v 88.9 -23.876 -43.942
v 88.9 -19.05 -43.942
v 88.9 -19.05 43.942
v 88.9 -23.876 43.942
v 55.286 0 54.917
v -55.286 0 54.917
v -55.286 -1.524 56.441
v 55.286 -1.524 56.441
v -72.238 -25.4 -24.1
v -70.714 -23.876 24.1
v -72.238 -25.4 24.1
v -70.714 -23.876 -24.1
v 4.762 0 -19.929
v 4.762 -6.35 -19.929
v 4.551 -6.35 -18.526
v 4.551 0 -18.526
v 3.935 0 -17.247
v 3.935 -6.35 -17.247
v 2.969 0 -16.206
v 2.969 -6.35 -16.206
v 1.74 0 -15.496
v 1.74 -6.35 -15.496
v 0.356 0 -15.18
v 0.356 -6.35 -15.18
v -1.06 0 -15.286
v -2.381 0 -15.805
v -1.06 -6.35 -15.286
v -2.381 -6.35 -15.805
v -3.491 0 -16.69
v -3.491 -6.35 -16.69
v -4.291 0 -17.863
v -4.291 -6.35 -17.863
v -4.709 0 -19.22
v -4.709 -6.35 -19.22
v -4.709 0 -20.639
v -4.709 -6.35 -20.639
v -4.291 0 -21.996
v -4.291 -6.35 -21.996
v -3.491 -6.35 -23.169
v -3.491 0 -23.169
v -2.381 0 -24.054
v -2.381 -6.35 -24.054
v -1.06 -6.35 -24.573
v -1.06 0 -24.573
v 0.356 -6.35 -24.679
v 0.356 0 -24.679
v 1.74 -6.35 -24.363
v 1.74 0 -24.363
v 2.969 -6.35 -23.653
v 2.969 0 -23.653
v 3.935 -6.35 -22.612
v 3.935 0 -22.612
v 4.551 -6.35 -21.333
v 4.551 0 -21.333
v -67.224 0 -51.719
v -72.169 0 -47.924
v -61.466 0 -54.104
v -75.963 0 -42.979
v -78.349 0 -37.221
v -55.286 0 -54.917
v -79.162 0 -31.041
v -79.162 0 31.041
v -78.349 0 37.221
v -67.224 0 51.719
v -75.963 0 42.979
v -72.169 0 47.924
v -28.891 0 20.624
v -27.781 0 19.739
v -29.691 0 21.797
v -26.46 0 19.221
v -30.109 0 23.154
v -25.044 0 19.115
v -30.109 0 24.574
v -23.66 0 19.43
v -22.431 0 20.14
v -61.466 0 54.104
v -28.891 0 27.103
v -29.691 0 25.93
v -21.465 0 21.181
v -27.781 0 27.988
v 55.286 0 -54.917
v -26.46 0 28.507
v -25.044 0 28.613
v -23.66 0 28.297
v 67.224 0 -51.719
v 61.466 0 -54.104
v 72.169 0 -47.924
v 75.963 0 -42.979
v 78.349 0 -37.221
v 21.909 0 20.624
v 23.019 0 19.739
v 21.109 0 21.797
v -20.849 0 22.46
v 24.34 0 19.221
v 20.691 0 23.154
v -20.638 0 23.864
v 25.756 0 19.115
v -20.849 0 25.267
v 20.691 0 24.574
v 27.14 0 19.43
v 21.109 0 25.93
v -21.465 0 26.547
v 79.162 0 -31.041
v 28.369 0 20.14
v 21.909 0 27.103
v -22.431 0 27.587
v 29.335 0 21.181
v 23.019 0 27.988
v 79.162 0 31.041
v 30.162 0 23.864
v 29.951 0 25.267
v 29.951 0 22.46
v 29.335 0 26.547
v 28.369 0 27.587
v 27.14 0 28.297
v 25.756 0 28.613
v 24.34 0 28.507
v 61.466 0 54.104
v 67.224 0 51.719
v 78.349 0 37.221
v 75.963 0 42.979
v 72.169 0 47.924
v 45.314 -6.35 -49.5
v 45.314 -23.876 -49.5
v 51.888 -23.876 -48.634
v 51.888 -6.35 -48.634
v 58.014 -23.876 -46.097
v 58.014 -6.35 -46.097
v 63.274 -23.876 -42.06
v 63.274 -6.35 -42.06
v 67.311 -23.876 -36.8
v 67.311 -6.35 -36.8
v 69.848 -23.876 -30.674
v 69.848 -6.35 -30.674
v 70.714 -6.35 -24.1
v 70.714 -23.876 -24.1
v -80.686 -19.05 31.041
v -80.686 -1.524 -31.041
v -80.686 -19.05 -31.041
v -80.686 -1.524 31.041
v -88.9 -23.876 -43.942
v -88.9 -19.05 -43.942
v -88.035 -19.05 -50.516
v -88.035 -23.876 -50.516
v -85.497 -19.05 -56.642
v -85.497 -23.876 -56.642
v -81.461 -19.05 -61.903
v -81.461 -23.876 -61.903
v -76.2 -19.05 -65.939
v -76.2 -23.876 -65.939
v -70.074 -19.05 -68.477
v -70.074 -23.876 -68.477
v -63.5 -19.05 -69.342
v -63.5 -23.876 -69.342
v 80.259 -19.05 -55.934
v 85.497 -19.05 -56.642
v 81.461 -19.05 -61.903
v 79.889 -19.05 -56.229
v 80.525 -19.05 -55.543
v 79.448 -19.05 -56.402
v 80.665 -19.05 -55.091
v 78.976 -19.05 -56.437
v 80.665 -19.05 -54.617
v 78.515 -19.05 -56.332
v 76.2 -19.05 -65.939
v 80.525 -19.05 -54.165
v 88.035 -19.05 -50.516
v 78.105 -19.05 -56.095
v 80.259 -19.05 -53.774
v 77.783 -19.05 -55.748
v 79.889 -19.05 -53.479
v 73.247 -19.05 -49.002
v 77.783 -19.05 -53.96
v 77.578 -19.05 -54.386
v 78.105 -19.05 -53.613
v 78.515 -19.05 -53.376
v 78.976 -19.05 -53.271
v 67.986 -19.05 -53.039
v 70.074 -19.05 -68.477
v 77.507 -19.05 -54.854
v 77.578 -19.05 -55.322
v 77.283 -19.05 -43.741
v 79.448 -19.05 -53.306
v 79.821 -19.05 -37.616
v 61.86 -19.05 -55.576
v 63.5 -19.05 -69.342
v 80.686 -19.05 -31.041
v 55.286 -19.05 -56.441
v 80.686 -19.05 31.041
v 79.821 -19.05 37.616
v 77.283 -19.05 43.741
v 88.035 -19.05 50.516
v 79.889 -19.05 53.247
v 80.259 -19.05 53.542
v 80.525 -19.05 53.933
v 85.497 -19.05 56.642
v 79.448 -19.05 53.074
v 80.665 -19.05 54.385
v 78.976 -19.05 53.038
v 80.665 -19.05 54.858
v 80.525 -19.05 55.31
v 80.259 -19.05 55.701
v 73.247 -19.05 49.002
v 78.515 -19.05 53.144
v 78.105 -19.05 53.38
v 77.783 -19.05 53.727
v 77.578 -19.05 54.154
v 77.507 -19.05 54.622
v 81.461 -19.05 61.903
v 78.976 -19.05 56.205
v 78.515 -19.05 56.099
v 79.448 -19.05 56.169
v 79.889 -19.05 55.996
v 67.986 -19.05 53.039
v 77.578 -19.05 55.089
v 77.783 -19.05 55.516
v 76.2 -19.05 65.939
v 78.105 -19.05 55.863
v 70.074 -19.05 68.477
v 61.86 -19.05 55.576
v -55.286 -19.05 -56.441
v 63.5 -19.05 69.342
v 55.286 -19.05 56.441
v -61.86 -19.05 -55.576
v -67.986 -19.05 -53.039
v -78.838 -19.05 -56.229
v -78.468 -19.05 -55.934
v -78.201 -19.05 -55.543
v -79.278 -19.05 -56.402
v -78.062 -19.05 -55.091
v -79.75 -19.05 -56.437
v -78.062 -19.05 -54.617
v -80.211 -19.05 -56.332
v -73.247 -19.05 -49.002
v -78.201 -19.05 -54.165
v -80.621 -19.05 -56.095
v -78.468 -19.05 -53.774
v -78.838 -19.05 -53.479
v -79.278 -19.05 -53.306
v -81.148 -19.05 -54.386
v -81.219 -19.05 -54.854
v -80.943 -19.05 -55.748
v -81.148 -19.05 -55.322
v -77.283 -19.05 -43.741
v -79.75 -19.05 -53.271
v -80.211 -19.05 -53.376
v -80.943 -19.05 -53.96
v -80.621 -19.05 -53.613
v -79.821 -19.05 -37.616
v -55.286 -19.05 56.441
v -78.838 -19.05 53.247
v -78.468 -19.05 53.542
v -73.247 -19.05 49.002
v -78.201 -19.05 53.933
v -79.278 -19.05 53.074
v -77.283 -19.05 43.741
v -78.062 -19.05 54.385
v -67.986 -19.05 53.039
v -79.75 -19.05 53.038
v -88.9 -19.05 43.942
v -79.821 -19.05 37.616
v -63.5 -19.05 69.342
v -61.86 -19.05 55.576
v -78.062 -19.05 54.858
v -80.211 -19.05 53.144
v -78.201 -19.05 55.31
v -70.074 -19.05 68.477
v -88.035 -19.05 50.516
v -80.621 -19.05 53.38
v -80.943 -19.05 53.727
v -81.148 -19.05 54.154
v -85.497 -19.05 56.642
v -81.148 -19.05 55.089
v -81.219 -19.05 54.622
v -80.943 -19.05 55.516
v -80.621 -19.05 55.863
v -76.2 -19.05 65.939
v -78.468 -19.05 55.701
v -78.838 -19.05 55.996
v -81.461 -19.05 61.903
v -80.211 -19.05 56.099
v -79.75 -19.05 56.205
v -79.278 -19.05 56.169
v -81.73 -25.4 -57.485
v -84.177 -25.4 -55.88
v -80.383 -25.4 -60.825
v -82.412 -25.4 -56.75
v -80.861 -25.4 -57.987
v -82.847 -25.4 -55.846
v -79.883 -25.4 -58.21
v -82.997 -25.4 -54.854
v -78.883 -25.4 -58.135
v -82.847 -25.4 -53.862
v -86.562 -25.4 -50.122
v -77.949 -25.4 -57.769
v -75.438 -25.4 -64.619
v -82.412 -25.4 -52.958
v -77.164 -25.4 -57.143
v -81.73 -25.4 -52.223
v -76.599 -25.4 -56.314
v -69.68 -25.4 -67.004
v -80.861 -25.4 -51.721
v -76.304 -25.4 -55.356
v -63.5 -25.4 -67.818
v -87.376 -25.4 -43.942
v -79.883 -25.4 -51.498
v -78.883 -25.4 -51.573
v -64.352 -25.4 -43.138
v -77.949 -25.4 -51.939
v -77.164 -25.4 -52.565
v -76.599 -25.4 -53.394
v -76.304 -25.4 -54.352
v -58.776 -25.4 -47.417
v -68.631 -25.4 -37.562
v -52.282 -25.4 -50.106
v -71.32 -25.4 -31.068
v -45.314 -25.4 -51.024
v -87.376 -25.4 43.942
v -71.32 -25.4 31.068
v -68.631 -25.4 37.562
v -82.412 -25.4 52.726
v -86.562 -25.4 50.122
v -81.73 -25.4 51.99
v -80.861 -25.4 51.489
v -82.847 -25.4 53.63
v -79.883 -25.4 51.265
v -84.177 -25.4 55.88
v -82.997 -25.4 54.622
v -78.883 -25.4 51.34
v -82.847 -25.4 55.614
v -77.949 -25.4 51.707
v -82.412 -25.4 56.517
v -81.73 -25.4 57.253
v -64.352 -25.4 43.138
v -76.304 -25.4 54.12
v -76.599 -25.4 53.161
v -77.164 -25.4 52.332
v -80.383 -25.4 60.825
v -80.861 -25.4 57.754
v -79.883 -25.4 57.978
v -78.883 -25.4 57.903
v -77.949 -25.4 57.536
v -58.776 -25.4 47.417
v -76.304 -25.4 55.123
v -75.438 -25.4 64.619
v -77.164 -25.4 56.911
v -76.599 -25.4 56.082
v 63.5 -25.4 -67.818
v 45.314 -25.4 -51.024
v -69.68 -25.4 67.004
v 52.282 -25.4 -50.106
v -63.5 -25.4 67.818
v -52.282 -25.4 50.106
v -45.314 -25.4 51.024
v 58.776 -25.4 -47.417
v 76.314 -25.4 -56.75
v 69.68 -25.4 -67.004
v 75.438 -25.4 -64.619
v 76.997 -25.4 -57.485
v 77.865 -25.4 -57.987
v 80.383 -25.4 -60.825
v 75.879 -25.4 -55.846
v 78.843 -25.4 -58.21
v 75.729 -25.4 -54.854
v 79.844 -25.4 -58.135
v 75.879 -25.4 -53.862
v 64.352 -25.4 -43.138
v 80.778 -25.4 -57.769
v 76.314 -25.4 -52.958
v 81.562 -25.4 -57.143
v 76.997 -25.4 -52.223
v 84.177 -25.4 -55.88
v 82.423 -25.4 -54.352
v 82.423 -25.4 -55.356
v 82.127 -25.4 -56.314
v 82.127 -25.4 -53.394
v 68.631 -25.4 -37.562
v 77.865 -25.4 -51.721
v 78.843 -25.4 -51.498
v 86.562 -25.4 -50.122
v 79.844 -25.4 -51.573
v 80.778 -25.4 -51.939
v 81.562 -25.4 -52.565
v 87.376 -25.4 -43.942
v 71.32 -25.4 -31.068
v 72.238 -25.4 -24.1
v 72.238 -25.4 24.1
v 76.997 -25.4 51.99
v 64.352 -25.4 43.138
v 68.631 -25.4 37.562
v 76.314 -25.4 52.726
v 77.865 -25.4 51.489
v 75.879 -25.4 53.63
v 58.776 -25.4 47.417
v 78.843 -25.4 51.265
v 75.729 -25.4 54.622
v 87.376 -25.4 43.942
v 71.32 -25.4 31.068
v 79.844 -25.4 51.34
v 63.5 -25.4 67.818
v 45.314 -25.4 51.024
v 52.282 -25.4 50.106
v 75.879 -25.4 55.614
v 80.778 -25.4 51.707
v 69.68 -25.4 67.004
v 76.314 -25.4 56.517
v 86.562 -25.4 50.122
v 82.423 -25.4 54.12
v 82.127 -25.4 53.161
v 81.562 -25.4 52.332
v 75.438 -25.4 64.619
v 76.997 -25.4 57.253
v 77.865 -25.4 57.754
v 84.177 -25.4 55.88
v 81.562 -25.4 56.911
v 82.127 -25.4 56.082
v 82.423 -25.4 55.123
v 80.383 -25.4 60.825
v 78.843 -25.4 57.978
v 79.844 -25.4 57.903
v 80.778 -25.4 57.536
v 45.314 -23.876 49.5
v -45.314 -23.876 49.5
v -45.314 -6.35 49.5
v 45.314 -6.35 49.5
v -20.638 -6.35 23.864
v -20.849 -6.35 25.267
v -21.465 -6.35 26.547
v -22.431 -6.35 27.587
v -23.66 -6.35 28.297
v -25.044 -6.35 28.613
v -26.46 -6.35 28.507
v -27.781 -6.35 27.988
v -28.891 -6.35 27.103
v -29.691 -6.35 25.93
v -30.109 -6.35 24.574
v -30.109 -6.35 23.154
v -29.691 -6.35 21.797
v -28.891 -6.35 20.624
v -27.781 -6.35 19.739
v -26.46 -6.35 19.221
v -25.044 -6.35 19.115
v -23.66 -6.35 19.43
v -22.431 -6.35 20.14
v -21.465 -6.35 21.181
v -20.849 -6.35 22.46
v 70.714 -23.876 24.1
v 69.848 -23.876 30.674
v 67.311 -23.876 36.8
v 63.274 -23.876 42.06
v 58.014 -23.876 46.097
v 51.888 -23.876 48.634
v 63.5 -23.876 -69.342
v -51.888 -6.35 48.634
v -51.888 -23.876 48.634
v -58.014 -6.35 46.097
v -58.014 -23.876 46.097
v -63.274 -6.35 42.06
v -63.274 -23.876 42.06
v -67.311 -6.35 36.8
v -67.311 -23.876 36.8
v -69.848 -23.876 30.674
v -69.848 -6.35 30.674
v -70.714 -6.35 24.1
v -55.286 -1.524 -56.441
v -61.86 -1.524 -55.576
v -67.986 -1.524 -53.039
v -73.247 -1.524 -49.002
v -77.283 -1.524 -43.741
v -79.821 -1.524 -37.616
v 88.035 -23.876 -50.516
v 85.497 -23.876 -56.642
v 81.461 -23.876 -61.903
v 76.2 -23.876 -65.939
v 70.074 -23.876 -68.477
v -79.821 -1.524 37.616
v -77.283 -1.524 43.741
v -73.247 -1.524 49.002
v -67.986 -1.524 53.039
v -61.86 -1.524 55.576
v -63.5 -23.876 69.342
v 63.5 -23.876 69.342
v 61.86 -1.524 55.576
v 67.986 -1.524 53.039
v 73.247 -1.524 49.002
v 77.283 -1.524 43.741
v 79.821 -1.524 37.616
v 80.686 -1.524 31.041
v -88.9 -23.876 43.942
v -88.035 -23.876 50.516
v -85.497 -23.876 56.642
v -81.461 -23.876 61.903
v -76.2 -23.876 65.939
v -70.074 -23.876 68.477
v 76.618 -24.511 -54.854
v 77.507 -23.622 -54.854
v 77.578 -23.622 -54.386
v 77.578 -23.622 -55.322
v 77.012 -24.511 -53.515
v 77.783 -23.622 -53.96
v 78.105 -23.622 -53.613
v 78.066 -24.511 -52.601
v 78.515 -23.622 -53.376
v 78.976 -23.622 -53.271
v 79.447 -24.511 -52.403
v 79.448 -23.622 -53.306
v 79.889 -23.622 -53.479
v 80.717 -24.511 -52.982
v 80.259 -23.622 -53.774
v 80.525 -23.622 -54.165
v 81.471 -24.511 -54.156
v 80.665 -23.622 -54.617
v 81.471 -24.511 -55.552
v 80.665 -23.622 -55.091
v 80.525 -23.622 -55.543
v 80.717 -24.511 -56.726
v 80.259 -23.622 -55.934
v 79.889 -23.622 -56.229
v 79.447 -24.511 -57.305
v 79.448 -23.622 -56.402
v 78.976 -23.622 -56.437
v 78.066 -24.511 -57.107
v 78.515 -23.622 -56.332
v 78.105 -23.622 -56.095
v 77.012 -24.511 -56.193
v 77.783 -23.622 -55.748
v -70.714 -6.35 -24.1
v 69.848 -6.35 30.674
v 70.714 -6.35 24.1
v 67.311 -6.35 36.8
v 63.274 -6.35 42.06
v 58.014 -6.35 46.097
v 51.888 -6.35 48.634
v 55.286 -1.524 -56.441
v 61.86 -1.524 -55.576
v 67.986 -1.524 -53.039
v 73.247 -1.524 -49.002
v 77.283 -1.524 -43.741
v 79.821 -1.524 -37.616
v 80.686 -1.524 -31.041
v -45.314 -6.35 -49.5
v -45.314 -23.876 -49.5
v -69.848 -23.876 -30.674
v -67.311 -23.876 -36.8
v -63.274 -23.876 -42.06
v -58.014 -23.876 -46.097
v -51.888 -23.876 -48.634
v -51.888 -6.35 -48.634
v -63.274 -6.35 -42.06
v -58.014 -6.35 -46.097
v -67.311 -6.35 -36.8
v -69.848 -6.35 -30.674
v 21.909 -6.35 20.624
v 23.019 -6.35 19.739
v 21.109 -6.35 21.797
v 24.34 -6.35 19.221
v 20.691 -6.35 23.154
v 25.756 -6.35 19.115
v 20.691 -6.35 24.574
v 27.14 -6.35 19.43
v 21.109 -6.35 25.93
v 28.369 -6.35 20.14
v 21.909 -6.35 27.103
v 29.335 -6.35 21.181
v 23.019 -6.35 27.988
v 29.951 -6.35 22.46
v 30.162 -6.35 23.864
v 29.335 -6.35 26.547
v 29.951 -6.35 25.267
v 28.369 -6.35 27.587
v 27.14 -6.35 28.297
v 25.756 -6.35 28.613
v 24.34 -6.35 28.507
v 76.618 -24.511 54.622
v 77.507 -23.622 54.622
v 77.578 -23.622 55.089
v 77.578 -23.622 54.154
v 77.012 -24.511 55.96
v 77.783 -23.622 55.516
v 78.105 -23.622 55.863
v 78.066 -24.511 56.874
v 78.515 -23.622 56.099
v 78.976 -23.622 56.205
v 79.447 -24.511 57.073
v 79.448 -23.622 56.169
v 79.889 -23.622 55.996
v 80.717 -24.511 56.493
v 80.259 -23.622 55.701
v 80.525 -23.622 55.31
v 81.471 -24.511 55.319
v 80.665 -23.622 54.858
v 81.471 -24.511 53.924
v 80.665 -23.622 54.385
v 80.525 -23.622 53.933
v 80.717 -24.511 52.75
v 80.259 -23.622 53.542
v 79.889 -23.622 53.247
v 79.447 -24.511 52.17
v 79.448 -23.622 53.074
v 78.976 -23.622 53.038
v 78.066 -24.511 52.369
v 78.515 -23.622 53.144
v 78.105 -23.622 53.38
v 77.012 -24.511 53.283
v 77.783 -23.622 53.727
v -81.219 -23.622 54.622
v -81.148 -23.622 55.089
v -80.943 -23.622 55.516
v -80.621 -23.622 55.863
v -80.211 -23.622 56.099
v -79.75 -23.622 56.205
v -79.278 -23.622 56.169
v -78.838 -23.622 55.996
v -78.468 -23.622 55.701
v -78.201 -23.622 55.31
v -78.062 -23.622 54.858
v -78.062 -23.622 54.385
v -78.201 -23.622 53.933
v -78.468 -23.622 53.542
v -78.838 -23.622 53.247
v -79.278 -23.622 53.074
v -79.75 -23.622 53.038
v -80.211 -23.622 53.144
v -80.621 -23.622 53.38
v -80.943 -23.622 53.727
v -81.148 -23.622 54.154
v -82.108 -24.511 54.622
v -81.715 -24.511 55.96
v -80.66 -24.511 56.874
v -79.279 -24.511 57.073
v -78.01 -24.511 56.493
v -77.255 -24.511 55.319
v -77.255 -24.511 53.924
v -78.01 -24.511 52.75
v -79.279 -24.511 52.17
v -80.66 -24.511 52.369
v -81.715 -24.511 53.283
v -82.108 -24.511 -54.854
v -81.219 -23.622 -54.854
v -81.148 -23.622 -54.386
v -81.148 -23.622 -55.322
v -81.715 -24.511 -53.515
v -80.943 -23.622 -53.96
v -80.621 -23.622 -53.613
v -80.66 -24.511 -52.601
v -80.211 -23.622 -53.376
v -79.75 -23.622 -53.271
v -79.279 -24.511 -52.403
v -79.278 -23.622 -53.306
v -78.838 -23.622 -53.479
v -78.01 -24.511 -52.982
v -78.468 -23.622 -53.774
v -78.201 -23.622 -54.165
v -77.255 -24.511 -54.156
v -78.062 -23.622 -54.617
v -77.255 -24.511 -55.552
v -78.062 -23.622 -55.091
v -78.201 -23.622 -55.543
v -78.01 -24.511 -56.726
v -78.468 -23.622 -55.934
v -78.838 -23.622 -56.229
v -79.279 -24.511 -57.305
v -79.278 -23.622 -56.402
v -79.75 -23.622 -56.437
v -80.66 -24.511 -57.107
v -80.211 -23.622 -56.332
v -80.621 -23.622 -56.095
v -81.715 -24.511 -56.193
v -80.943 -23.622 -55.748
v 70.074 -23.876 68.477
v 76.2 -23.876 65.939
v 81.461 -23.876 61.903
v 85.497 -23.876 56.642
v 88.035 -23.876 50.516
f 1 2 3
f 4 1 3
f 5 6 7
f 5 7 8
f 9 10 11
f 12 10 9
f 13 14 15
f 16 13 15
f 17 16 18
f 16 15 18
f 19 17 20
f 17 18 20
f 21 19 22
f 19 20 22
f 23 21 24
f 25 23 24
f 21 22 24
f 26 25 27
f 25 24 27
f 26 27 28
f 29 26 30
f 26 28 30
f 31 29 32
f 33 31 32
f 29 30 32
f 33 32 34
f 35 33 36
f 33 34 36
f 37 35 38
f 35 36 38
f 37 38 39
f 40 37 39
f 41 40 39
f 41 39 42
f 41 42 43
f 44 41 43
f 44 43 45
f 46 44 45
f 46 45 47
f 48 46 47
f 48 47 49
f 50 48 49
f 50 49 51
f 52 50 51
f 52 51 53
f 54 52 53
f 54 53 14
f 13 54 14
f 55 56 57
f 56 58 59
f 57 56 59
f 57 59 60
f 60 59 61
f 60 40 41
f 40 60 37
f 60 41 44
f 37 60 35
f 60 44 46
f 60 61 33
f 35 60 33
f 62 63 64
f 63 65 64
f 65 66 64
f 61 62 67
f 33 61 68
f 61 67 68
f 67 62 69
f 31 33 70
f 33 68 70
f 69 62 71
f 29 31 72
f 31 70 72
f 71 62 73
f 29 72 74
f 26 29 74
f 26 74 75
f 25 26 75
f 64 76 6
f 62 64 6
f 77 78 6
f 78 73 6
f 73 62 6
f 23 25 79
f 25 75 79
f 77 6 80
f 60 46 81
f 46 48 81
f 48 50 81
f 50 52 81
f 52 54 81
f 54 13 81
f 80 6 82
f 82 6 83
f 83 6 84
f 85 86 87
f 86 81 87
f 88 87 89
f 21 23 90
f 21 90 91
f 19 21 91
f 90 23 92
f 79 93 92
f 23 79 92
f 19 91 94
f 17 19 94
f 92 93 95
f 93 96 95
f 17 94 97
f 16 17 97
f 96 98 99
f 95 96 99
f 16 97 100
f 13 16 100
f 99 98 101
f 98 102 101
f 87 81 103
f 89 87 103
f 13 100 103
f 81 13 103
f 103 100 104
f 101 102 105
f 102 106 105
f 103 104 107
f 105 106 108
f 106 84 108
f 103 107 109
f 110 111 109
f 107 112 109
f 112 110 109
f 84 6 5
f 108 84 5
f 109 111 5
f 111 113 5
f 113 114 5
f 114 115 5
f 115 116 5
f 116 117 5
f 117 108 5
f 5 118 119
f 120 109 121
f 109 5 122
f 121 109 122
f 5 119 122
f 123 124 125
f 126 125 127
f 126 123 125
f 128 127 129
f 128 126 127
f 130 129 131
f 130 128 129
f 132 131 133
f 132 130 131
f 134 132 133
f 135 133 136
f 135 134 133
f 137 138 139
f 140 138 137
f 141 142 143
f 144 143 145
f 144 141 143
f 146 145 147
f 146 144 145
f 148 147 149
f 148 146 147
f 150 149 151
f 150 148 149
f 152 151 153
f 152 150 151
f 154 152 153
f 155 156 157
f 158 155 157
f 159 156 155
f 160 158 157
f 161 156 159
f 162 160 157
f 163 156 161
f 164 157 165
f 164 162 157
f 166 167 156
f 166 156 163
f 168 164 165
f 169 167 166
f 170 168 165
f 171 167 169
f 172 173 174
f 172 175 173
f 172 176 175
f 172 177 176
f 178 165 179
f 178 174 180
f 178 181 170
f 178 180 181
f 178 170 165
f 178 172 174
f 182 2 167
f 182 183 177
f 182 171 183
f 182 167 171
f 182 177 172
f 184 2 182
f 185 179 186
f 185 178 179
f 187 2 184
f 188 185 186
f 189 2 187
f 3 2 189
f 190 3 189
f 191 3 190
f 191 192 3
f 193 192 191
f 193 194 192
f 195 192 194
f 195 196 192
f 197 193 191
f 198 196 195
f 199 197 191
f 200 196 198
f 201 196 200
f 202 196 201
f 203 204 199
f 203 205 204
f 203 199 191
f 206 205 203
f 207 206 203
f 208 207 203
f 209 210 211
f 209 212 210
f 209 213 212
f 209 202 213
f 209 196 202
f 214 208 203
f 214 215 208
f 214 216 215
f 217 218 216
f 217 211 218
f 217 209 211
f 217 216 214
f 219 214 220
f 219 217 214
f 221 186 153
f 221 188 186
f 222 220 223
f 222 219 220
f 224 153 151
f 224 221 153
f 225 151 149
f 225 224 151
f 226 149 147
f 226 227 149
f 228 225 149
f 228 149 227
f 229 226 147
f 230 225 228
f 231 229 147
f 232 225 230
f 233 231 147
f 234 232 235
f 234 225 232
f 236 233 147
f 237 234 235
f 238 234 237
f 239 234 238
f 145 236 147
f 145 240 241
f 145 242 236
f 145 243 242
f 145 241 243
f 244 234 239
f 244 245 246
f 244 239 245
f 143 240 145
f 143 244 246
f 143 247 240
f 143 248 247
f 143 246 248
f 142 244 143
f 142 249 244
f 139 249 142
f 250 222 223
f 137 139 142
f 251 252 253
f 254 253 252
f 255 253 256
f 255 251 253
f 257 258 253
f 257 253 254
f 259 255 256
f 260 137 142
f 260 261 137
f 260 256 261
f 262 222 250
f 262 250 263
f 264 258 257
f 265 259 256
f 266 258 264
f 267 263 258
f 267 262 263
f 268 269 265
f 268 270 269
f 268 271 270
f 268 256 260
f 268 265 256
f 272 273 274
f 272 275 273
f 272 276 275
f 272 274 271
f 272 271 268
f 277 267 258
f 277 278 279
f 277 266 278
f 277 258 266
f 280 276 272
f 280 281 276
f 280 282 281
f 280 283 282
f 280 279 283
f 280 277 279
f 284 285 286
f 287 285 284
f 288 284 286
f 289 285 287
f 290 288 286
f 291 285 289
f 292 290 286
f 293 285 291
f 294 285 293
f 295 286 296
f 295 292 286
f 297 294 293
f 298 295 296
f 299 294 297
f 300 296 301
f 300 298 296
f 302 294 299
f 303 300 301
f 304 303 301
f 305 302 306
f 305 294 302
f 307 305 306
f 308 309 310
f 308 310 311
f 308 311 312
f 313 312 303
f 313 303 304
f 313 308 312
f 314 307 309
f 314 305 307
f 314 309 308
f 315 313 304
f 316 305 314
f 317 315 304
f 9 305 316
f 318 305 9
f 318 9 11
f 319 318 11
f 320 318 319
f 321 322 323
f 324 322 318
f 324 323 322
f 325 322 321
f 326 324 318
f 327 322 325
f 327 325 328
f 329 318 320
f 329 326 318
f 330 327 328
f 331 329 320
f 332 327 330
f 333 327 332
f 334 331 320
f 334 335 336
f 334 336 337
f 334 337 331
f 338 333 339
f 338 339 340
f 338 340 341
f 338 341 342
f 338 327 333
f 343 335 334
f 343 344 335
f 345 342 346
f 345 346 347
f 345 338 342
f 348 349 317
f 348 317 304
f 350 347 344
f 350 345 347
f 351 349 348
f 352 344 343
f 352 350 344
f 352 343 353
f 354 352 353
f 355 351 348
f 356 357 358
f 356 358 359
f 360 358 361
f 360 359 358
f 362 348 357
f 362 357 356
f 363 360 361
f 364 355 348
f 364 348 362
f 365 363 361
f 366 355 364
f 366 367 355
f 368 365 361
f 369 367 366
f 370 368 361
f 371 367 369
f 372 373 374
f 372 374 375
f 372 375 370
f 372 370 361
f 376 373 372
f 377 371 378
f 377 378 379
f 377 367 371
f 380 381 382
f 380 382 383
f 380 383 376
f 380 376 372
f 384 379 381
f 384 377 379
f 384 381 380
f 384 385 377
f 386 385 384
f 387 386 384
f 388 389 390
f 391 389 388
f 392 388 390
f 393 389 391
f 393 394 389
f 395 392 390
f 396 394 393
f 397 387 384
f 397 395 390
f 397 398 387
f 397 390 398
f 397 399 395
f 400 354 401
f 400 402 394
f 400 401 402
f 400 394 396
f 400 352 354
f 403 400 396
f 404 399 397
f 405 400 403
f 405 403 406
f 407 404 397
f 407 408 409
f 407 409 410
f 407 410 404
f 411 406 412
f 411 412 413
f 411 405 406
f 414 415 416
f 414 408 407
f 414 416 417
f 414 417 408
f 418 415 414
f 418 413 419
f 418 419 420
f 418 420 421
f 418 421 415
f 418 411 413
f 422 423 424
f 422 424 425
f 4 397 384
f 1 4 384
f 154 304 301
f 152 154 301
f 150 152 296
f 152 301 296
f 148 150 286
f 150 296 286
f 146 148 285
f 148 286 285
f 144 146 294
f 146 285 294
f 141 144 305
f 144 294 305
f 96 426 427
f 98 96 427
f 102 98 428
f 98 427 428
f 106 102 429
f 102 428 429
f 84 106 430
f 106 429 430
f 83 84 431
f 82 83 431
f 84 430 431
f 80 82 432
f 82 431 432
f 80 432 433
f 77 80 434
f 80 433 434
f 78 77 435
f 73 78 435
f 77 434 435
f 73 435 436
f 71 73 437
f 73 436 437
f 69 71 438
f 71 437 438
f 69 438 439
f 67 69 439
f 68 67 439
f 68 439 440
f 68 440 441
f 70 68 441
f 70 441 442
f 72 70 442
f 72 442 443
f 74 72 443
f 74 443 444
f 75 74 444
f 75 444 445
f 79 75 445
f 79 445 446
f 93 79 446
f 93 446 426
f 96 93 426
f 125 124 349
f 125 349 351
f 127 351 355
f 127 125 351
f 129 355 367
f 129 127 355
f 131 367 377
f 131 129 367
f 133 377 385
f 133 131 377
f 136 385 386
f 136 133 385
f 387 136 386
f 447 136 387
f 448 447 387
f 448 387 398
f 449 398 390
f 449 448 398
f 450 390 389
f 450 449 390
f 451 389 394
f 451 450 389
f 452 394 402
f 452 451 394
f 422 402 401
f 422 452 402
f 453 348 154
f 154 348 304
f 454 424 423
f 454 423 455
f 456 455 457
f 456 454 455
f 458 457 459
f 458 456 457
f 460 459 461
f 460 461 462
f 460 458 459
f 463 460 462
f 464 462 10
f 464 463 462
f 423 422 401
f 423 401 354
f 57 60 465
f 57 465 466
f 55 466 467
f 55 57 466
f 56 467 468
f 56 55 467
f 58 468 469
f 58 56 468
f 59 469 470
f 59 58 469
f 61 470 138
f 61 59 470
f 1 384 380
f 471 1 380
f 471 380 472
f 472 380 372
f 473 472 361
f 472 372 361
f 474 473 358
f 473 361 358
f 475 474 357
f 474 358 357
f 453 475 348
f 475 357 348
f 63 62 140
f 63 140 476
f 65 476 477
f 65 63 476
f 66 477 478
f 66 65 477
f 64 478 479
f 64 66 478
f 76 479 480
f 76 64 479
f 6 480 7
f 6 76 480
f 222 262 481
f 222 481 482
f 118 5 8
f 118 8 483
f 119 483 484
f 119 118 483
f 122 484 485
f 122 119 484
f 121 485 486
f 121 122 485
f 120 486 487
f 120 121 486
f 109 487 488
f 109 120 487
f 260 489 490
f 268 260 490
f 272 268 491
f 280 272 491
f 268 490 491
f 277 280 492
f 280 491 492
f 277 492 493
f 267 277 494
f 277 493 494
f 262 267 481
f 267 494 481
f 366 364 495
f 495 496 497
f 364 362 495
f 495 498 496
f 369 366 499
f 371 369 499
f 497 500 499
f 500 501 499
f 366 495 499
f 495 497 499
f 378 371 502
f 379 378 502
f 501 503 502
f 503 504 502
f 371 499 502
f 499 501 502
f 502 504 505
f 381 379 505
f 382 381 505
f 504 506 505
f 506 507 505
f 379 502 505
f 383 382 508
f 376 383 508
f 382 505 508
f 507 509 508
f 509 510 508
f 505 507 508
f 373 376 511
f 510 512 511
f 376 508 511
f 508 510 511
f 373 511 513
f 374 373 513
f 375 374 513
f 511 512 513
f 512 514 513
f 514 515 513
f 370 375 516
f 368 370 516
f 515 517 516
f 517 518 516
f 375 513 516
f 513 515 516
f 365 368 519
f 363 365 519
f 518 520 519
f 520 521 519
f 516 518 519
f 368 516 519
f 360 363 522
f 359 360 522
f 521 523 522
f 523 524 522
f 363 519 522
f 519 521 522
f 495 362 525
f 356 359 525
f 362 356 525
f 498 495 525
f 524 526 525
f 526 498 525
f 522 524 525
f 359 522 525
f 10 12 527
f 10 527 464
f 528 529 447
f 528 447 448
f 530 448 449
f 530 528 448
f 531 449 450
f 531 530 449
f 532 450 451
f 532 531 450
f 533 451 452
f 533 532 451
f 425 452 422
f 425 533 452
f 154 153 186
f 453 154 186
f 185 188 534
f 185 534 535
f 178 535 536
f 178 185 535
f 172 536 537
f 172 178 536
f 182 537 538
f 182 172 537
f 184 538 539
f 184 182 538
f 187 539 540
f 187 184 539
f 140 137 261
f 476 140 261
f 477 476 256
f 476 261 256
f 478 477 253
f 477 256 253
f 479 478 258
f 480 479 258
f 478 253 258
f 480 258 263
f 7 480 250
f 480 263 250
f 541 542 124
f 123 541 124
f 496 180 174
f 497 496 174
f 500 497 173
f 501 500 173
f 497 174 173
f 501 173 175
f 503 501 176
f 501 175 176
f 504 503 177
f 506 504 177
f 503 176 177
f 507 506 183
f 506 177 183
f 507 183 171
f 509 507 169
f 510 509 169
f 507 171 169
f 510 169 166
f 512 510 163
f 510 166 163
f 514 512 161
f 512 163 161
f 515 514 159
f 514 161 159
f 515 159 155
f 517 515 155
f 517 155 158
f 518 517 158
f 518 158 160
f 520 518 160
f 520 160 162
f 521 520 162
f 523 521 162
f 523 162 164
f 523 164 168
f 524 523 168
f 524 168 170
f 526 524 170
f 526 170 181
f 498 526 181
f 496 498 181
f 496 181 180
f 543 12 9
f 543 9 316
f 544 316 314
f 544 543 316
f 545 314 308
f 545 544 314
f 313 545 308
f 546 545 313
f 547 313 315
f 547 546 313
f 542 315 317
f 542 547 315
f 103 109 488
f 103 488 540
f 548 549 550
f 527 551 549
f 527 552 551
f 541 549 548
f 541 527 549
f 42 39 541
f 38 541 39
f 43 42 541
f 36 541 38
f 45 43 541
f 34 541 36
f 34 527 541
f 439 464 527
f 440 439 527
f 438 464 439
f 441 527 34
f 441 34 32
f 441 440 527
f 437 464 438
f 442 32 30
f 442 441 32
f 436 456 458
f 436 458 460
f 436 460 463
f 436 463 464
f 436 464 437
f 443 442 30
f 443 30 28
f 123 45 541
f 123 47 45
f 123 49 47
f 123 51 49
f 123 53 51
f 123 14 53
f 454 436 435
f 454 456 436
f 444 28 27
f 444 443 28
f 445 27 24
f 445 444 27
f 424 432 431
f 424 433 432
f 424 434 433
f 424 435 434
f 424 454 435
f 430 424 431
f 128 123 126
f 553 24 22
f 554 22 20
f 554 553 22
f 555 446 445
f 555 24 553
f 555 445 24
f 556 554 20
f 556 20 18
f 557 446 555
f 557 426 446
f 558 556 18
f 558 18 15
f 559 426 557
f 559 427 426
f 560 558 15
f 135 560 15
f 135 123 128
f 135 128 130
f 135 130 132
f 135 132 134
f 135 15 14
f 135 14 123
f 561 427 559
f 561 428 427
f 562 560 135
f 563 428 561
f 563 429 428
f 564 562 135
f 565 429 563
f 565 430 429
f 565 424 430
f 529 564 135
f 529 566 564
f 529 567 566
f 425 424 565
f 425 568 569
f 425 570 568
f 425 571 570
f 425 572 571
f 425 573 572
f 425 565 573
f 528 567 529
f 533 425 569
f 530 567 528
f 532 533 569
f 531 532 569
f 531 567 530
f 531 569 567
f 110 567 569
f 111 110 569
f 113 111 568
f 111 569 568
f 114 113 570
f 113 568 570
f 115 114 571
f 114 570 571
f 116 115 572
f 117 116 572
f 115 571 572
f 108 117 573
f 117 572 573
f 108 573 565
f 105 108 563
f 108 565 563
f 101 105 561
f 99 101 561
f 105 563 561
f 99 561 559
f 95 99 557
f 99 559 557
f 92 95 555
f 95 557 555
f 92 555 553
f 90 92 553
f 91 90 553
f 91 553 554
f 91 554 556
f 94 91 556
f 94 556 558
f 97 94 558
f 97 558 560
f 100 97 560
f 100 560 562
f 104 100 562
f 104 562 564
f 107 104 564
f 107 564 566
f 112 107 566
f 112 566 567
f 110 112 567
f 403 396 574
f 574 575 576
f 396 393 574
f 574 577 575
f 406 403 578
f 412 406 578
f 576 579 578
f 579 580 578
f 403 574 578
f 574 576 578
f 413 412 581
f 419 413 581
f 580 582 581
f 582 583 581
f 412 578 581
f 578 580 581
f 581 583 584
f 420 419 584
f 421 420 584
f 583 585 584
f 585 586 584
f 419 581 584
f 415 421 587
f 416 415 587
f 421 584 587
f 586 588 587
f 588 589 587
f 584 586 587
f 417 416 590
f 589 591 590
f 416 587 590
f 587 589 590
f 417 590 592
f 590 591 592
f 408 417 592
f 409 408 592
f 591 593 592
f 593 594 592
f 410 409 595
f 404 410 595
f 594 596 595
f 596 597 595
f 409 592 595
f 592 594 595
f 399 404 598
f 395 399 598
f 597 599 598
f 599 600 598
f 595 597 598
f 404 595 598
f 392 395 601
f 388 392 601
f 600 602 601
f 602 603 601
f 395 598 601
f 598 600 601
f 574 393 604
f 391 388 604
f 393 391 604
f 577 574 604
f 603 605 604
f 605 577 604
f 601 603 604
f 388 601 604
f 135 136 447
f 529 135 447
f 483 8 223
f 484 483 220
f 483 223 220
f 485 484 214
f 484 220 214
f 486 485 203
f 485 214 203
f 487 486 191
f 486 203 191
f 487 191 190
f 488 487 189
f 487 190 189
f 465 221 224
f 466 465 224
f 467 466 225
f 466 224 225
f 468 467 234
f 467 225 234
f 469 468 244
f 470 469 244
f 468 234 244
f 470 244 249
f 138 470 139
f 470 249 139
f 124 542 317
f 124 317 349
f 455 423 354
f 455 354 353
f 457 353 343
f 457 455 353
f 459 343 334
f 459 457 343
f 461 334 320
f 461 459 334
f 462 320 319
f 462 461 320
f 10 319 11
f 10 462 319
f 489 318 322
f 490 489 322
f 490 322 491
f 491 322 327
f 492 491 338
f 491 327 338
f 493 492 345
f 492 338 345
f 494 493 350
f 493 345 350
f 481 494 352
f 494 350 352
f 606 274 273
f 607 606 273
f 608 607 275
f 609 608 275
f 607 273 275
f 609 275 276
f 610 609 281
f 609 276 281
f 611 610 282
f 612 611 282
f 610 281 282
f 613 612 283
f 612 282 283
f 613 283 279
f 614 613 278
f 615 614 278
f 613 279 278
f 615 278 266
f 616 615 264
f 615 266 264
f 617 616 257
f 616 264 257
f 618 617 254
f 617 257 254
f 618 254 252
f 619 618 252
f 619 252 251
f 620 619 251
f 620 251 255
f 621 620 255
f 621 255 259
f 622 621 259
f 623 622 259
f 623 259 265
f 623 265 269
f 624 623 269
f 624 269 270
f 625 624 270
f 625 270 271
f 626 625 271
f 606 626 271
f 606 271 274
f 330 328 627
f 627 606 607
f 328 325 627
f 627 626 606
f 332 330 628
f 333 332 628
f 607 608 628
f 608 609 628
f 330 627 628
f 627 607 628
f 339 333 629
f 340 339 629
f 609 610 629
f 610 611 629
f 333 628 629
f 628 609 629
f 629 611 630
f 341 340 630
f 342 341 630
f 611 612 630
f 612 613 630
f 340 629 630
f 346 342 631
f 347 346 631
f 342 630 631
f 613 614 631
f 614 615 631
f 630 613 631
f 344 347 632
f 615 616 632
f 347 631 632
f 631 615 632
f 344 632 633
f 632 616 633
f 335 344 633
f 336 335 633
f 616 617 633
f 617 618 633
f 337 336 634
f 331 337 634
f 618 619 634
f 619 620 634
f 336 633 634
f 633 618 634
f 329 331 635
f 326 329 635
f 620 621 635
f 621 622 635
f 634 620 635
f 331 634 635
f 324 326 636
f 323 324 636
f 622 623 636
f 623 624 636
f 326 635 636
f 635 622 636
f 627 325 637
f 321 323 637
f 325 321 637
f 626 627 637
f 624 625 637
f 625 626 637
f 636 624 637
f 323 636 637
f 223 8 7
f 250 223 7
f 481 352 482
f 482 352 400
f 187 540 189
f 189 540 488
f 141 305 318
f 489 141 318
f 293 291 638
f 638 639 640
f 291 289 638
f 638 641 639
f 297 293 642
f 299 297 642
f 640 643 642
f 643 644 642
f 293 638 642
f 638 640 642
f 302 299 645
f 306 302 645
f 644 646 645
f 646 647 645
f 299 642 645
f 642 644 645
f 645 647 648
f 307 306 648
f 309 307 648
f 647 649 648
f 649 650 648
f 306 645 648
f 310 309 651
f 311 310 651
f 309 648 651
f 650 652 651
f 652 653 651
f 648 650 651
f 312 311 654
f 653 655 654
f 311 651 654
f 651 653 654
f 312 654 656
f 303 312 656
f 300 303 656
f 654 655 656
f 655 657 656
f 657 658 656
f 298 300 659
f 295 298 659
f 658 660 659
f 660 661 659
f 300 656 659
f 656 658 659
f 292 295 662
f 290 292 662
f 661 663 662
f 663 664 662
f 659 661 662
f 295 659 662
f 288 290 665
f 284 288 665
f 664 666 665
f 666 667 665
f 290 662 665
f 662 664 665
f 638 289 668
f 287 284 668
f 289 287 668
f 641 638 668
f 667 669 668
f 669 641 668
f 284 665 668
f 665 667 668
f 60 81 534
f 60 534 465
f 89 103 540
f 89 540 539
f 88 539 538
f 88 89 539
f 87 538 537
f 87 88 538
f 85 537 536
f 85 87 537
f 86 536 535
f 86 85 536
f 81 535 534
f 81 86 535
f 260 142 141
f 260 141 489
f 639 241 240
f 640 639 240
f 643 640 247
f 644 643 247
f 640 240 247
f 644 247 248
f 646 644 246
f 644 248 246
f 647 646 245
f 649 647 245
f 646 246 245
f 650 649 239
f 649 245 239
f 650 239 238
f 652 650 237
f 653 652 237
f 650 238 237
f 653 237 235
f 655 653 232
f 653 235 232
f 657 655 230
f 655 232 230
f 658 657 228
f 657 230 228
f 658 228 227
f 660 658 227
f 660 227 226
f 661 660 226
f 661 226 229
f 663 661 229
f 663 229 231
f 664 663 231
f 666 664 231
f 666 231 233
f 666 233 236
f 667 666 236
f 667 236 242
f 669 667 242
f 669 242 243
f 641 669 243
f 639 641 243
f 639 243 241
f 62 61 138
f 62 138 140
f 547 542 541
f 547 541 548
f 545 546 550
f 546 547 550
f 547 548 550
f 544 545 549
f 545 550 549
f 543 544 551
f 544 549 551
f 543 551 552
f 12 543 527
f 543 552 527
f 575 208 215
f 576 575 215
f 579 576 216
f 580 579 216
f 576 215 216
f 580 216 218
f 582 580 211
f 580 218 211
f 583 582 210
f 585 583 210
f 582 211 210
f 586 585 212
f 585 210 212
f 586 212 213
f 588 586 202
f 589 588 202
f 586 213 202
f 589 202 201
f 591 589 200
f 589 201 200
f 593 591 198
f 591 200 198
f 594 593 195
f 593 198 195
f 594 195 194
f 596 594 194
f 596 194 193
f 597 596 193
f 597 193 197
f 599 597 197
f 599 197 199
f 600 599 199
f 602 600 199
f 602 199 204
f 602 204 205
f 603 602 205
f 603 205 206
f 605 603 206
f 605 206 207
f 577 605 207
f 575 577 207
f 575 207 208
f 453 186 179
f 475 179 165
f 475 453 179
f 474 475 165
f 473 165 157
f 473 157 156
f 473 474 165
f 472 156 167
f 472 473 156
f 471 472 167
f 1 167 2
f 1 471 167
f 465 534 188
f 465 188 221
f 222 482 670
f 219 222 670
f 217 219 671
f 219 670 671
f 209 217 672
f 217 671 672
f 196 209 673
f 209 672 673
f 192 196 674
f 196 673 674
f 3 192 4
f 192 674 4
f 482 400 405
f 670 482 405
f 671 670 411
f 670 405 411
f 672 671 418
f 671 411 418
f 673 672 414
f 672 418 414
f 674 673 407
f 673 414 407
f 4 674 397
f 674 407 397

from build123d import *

# Parameters (mm, degrees)
F0_W      = 177.8
F0_H      = 138.684
F1_DEPTH  = 25.4
F2_W      = 177.8
F2_H      = 138.684
F2_W_2    = 161.3722443581
F2_H_2    = 112.8829941154
F3_DEPTH  = 19.05
F4_W      = 141.4277553558
F4_H      = 98.9994257689
F5_DEPTH  = 19.05
F6_R      = 25.4
F7_R      = 4.7625
F8_DEPTH  = 6.351
F9_SIZE   = 1.524
F10_R     = 1.5875
F11_DEPTH = 6.351
F12_SIZE  = 1.778


with BuildPart() as f1:
    # F0 (on Front) → F1 (new body)
    with BuildSketch(Plane.XZ):
        Rectangle(F0_W, F0_H)
    extrude(amount=F1_DEPTH)

    # F2 (on face) → F3 (cut)
    with BuildSketch(Plane(origin=(0, 0, 0), x_dir=(-1, 0, 0), z_dir=(0, 1, 0))):
        Rectangle(F2_W, F2_H)
        Rectangle(F2_W_2, F2_H_2, mode=Mode.SUBTRACT)
    extrude(amount=-F3_DEPTH, mode=Mode.SUBTRACT)

    # F4 (on face) → F5 (cut)
    with BuildSketch(Plane.XZ.offset(25.4)):
        Rectangle(F4_W, F4_H)
    extrude(amount=-F5_DEPTH, mode=Mode.SUBTRACT)

    # F6
    f6_edges = [f1.edges().sort_by_distance(p)[0] for p in [
        (88.9, -22.225, 69.342),
        (88.9, -22.225, -69.342),
        (-88.9, -22.225, -69.342),
        (-88.9, -22.225, 69.342),
        (-70.713878, -15.875, 49.499713),
        (70.713878, -15.875, 49.499713),
        (70.713878, -15.875, -49.499713),
        (-70.713878, -15.875, -49.499713),
        (80.686122, -9.525, -56.441497),
        (80.686122, -9.525, 56.441497),
        (-80.686122, -9.525, -56.441497),
        (-80.686122, -9.525, 56.441497),
    ]]
    fillet(f6_edges, radius=F6_R)

    # F7 (on face) → F8 (cut, through all)
    with BuildSketch(Plane.XZ.offset(6.35)):
        with Locations((-25.4, 23.863709036)):
            Circle(F7_R)
        with Locations((25.4, 23.863709036)):
            Circle(F7_R)
        with Locations((0, -19.9294611812)):
            Circle(F7_R)
    extrude(amount=-F8_DEPTH, mode=Mode.SUBTRACT)

    # F9
    f9_edges = [f1.edges().sort_by_distance(p)[0] for p in [
        (0, -25.4, -49.499713),
        (70.713878, -25.4, 0),
        (-88.9, -25.4, 0),
        (-81.460512, -25.4, -61.902512),
        (0, 0, -56.441497),
        (88.9, -25.4, 0),
        (81.460512, -25.4, 61.902512),
        (81.460512, -25.4, -61.902512),
        (0, -25.4, -69.342),
        (0, -25.4, 69.342),
        (-81.460512, -25.4, 61.902512),
        (-63.27439, -25.4, -42.060225),
        (63.27439, -25.4, -42.060225),
        (-70.713878, -25.4, 0),
        (-63.27439, -25.4, 42.060225),
        (63.27439, -25.4, 42.060225),
        (0, -25.4, 49.499713),
        (-80.686122, 0, 0),
        (-73.246634, 0, 49.002009),
        (-73.246634, 0, -49.002009),
        (0, 0, 56.441497),
        (73.246634, 0, 49.002009),
        (73.246634, 0, -49.002009),
        (80.686122, 0, 0),
    ]]
    chamfer(f9_edges, length=F9_SIZE)

    # F10 (on face) → F11 (cut, through all)
    with BuildSketch(Plane(origin=(0, -19.05, 0), x_dir=(-1, 0, 0), z_dir=(0, 1, 0))):
        with Locations((-79.0948867798, 54.6215597034)):
            Circle(F10_R)
        with Locations((79.6314403415, 54.6215597034)):
            Circle(F10_R)
        with Locations((79.6314403415, -54.8539970577)):
            Circle(F10_R)
        with Locations((-79.0948867798, -54.8539970577)):
            Circle(F10_R)
    extrude(amount=-F11_DEPTH, mode=Mode.SUBTRACT)

    # F12
    f12_edges = [f1.edges().sort_by_distance(p)[0] for p in [
        (-78.04394, -25.4, 54.62156),
        (80.682387, -25.4, 54.62156),
        (80.682387, -25.4, -54.853997),
        (-78.04394, -25.4, -54.853997),
    ]]
    chamfer(f12_edges, length=F12_SIZE)


solid = f1.part
